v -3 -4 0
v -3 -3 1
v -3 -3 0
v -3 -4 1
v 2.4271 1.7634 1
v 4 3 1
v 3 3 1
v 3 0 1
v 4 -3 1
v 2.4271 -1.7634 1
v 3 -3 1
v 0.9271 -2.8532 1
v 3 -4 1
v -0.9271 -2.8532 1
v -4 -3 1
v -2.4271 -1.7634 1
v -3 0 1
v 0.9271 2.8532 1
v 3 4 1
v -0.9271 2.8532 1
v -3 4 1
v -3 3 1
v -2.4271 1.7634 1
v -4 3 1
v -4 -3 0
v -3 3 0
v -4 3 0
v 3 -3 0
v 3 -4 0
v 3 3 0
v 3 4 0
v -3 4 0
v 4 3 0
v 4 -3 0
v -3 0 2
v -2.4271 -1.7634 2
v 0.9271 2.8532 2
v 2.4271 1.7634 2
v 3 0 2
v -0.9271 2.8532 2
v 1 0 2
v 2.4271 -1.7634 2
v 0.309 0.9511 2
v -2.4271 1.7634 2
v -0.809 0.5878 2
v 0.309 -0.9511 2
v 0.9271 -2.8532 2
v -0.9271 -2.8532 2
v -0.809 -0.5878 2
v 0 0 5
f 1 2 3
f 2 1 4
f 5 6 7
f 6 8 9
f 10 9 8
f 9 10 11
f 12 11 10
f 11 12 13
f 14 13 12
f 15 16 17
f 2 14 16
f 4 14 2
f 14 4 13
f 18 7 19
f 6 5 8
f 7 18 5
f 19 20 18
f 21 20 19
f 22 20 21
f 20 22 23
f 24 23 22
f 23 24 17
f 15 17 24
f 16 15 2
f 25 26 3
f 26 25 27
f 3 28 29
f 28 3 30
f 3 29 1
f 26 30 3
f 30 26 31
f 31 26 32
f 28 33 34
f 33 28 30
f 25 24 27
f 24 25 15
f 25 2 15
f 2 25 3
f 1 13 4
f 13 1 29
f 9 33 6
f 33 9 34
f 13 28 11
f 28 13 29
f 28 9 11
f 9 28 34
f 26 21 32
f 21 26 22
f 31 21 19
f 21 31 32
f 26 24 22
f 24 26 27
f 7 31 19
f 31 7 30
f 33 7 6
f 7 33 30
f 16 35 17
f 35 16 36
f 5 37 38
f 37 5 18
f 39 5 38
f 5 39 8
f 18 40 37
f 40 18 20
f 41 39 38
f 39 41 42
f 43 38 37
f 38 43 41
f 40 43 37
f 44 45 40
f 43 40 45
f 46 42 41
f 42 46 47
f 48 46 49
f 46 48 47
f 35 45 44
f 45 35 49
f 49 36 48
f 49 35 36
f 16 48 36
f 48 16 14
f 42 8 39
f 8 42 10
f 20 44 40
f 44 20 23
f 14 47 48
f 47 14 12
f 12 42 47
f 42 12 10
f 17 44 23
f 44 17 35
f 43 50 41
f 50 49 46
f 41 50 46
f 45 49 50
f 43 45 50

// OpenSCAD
union() {
    translate([-4, -4, 0])
    difference() {
        translate ([0, 0, 0])
            cube([8, 8, 1]);
        union() {
            translate ([0, 0, 0])
                cube([1, 1, 1]);
            translate ([7, 0, 0])
                cube([1, 1, 1]);
            translate ([0, 7, 0])
                cube([1, 1, 1]);
            translate ([7, 7, 0])
                cube([1, 1, 1]);
        }
    }
    translate ([0, 0, 1])
        cylinder(h=1, r1=3, r2=3);
    translate([0, 0, 2])
        cylinder(h=3, r1=1, r2=0);
}
